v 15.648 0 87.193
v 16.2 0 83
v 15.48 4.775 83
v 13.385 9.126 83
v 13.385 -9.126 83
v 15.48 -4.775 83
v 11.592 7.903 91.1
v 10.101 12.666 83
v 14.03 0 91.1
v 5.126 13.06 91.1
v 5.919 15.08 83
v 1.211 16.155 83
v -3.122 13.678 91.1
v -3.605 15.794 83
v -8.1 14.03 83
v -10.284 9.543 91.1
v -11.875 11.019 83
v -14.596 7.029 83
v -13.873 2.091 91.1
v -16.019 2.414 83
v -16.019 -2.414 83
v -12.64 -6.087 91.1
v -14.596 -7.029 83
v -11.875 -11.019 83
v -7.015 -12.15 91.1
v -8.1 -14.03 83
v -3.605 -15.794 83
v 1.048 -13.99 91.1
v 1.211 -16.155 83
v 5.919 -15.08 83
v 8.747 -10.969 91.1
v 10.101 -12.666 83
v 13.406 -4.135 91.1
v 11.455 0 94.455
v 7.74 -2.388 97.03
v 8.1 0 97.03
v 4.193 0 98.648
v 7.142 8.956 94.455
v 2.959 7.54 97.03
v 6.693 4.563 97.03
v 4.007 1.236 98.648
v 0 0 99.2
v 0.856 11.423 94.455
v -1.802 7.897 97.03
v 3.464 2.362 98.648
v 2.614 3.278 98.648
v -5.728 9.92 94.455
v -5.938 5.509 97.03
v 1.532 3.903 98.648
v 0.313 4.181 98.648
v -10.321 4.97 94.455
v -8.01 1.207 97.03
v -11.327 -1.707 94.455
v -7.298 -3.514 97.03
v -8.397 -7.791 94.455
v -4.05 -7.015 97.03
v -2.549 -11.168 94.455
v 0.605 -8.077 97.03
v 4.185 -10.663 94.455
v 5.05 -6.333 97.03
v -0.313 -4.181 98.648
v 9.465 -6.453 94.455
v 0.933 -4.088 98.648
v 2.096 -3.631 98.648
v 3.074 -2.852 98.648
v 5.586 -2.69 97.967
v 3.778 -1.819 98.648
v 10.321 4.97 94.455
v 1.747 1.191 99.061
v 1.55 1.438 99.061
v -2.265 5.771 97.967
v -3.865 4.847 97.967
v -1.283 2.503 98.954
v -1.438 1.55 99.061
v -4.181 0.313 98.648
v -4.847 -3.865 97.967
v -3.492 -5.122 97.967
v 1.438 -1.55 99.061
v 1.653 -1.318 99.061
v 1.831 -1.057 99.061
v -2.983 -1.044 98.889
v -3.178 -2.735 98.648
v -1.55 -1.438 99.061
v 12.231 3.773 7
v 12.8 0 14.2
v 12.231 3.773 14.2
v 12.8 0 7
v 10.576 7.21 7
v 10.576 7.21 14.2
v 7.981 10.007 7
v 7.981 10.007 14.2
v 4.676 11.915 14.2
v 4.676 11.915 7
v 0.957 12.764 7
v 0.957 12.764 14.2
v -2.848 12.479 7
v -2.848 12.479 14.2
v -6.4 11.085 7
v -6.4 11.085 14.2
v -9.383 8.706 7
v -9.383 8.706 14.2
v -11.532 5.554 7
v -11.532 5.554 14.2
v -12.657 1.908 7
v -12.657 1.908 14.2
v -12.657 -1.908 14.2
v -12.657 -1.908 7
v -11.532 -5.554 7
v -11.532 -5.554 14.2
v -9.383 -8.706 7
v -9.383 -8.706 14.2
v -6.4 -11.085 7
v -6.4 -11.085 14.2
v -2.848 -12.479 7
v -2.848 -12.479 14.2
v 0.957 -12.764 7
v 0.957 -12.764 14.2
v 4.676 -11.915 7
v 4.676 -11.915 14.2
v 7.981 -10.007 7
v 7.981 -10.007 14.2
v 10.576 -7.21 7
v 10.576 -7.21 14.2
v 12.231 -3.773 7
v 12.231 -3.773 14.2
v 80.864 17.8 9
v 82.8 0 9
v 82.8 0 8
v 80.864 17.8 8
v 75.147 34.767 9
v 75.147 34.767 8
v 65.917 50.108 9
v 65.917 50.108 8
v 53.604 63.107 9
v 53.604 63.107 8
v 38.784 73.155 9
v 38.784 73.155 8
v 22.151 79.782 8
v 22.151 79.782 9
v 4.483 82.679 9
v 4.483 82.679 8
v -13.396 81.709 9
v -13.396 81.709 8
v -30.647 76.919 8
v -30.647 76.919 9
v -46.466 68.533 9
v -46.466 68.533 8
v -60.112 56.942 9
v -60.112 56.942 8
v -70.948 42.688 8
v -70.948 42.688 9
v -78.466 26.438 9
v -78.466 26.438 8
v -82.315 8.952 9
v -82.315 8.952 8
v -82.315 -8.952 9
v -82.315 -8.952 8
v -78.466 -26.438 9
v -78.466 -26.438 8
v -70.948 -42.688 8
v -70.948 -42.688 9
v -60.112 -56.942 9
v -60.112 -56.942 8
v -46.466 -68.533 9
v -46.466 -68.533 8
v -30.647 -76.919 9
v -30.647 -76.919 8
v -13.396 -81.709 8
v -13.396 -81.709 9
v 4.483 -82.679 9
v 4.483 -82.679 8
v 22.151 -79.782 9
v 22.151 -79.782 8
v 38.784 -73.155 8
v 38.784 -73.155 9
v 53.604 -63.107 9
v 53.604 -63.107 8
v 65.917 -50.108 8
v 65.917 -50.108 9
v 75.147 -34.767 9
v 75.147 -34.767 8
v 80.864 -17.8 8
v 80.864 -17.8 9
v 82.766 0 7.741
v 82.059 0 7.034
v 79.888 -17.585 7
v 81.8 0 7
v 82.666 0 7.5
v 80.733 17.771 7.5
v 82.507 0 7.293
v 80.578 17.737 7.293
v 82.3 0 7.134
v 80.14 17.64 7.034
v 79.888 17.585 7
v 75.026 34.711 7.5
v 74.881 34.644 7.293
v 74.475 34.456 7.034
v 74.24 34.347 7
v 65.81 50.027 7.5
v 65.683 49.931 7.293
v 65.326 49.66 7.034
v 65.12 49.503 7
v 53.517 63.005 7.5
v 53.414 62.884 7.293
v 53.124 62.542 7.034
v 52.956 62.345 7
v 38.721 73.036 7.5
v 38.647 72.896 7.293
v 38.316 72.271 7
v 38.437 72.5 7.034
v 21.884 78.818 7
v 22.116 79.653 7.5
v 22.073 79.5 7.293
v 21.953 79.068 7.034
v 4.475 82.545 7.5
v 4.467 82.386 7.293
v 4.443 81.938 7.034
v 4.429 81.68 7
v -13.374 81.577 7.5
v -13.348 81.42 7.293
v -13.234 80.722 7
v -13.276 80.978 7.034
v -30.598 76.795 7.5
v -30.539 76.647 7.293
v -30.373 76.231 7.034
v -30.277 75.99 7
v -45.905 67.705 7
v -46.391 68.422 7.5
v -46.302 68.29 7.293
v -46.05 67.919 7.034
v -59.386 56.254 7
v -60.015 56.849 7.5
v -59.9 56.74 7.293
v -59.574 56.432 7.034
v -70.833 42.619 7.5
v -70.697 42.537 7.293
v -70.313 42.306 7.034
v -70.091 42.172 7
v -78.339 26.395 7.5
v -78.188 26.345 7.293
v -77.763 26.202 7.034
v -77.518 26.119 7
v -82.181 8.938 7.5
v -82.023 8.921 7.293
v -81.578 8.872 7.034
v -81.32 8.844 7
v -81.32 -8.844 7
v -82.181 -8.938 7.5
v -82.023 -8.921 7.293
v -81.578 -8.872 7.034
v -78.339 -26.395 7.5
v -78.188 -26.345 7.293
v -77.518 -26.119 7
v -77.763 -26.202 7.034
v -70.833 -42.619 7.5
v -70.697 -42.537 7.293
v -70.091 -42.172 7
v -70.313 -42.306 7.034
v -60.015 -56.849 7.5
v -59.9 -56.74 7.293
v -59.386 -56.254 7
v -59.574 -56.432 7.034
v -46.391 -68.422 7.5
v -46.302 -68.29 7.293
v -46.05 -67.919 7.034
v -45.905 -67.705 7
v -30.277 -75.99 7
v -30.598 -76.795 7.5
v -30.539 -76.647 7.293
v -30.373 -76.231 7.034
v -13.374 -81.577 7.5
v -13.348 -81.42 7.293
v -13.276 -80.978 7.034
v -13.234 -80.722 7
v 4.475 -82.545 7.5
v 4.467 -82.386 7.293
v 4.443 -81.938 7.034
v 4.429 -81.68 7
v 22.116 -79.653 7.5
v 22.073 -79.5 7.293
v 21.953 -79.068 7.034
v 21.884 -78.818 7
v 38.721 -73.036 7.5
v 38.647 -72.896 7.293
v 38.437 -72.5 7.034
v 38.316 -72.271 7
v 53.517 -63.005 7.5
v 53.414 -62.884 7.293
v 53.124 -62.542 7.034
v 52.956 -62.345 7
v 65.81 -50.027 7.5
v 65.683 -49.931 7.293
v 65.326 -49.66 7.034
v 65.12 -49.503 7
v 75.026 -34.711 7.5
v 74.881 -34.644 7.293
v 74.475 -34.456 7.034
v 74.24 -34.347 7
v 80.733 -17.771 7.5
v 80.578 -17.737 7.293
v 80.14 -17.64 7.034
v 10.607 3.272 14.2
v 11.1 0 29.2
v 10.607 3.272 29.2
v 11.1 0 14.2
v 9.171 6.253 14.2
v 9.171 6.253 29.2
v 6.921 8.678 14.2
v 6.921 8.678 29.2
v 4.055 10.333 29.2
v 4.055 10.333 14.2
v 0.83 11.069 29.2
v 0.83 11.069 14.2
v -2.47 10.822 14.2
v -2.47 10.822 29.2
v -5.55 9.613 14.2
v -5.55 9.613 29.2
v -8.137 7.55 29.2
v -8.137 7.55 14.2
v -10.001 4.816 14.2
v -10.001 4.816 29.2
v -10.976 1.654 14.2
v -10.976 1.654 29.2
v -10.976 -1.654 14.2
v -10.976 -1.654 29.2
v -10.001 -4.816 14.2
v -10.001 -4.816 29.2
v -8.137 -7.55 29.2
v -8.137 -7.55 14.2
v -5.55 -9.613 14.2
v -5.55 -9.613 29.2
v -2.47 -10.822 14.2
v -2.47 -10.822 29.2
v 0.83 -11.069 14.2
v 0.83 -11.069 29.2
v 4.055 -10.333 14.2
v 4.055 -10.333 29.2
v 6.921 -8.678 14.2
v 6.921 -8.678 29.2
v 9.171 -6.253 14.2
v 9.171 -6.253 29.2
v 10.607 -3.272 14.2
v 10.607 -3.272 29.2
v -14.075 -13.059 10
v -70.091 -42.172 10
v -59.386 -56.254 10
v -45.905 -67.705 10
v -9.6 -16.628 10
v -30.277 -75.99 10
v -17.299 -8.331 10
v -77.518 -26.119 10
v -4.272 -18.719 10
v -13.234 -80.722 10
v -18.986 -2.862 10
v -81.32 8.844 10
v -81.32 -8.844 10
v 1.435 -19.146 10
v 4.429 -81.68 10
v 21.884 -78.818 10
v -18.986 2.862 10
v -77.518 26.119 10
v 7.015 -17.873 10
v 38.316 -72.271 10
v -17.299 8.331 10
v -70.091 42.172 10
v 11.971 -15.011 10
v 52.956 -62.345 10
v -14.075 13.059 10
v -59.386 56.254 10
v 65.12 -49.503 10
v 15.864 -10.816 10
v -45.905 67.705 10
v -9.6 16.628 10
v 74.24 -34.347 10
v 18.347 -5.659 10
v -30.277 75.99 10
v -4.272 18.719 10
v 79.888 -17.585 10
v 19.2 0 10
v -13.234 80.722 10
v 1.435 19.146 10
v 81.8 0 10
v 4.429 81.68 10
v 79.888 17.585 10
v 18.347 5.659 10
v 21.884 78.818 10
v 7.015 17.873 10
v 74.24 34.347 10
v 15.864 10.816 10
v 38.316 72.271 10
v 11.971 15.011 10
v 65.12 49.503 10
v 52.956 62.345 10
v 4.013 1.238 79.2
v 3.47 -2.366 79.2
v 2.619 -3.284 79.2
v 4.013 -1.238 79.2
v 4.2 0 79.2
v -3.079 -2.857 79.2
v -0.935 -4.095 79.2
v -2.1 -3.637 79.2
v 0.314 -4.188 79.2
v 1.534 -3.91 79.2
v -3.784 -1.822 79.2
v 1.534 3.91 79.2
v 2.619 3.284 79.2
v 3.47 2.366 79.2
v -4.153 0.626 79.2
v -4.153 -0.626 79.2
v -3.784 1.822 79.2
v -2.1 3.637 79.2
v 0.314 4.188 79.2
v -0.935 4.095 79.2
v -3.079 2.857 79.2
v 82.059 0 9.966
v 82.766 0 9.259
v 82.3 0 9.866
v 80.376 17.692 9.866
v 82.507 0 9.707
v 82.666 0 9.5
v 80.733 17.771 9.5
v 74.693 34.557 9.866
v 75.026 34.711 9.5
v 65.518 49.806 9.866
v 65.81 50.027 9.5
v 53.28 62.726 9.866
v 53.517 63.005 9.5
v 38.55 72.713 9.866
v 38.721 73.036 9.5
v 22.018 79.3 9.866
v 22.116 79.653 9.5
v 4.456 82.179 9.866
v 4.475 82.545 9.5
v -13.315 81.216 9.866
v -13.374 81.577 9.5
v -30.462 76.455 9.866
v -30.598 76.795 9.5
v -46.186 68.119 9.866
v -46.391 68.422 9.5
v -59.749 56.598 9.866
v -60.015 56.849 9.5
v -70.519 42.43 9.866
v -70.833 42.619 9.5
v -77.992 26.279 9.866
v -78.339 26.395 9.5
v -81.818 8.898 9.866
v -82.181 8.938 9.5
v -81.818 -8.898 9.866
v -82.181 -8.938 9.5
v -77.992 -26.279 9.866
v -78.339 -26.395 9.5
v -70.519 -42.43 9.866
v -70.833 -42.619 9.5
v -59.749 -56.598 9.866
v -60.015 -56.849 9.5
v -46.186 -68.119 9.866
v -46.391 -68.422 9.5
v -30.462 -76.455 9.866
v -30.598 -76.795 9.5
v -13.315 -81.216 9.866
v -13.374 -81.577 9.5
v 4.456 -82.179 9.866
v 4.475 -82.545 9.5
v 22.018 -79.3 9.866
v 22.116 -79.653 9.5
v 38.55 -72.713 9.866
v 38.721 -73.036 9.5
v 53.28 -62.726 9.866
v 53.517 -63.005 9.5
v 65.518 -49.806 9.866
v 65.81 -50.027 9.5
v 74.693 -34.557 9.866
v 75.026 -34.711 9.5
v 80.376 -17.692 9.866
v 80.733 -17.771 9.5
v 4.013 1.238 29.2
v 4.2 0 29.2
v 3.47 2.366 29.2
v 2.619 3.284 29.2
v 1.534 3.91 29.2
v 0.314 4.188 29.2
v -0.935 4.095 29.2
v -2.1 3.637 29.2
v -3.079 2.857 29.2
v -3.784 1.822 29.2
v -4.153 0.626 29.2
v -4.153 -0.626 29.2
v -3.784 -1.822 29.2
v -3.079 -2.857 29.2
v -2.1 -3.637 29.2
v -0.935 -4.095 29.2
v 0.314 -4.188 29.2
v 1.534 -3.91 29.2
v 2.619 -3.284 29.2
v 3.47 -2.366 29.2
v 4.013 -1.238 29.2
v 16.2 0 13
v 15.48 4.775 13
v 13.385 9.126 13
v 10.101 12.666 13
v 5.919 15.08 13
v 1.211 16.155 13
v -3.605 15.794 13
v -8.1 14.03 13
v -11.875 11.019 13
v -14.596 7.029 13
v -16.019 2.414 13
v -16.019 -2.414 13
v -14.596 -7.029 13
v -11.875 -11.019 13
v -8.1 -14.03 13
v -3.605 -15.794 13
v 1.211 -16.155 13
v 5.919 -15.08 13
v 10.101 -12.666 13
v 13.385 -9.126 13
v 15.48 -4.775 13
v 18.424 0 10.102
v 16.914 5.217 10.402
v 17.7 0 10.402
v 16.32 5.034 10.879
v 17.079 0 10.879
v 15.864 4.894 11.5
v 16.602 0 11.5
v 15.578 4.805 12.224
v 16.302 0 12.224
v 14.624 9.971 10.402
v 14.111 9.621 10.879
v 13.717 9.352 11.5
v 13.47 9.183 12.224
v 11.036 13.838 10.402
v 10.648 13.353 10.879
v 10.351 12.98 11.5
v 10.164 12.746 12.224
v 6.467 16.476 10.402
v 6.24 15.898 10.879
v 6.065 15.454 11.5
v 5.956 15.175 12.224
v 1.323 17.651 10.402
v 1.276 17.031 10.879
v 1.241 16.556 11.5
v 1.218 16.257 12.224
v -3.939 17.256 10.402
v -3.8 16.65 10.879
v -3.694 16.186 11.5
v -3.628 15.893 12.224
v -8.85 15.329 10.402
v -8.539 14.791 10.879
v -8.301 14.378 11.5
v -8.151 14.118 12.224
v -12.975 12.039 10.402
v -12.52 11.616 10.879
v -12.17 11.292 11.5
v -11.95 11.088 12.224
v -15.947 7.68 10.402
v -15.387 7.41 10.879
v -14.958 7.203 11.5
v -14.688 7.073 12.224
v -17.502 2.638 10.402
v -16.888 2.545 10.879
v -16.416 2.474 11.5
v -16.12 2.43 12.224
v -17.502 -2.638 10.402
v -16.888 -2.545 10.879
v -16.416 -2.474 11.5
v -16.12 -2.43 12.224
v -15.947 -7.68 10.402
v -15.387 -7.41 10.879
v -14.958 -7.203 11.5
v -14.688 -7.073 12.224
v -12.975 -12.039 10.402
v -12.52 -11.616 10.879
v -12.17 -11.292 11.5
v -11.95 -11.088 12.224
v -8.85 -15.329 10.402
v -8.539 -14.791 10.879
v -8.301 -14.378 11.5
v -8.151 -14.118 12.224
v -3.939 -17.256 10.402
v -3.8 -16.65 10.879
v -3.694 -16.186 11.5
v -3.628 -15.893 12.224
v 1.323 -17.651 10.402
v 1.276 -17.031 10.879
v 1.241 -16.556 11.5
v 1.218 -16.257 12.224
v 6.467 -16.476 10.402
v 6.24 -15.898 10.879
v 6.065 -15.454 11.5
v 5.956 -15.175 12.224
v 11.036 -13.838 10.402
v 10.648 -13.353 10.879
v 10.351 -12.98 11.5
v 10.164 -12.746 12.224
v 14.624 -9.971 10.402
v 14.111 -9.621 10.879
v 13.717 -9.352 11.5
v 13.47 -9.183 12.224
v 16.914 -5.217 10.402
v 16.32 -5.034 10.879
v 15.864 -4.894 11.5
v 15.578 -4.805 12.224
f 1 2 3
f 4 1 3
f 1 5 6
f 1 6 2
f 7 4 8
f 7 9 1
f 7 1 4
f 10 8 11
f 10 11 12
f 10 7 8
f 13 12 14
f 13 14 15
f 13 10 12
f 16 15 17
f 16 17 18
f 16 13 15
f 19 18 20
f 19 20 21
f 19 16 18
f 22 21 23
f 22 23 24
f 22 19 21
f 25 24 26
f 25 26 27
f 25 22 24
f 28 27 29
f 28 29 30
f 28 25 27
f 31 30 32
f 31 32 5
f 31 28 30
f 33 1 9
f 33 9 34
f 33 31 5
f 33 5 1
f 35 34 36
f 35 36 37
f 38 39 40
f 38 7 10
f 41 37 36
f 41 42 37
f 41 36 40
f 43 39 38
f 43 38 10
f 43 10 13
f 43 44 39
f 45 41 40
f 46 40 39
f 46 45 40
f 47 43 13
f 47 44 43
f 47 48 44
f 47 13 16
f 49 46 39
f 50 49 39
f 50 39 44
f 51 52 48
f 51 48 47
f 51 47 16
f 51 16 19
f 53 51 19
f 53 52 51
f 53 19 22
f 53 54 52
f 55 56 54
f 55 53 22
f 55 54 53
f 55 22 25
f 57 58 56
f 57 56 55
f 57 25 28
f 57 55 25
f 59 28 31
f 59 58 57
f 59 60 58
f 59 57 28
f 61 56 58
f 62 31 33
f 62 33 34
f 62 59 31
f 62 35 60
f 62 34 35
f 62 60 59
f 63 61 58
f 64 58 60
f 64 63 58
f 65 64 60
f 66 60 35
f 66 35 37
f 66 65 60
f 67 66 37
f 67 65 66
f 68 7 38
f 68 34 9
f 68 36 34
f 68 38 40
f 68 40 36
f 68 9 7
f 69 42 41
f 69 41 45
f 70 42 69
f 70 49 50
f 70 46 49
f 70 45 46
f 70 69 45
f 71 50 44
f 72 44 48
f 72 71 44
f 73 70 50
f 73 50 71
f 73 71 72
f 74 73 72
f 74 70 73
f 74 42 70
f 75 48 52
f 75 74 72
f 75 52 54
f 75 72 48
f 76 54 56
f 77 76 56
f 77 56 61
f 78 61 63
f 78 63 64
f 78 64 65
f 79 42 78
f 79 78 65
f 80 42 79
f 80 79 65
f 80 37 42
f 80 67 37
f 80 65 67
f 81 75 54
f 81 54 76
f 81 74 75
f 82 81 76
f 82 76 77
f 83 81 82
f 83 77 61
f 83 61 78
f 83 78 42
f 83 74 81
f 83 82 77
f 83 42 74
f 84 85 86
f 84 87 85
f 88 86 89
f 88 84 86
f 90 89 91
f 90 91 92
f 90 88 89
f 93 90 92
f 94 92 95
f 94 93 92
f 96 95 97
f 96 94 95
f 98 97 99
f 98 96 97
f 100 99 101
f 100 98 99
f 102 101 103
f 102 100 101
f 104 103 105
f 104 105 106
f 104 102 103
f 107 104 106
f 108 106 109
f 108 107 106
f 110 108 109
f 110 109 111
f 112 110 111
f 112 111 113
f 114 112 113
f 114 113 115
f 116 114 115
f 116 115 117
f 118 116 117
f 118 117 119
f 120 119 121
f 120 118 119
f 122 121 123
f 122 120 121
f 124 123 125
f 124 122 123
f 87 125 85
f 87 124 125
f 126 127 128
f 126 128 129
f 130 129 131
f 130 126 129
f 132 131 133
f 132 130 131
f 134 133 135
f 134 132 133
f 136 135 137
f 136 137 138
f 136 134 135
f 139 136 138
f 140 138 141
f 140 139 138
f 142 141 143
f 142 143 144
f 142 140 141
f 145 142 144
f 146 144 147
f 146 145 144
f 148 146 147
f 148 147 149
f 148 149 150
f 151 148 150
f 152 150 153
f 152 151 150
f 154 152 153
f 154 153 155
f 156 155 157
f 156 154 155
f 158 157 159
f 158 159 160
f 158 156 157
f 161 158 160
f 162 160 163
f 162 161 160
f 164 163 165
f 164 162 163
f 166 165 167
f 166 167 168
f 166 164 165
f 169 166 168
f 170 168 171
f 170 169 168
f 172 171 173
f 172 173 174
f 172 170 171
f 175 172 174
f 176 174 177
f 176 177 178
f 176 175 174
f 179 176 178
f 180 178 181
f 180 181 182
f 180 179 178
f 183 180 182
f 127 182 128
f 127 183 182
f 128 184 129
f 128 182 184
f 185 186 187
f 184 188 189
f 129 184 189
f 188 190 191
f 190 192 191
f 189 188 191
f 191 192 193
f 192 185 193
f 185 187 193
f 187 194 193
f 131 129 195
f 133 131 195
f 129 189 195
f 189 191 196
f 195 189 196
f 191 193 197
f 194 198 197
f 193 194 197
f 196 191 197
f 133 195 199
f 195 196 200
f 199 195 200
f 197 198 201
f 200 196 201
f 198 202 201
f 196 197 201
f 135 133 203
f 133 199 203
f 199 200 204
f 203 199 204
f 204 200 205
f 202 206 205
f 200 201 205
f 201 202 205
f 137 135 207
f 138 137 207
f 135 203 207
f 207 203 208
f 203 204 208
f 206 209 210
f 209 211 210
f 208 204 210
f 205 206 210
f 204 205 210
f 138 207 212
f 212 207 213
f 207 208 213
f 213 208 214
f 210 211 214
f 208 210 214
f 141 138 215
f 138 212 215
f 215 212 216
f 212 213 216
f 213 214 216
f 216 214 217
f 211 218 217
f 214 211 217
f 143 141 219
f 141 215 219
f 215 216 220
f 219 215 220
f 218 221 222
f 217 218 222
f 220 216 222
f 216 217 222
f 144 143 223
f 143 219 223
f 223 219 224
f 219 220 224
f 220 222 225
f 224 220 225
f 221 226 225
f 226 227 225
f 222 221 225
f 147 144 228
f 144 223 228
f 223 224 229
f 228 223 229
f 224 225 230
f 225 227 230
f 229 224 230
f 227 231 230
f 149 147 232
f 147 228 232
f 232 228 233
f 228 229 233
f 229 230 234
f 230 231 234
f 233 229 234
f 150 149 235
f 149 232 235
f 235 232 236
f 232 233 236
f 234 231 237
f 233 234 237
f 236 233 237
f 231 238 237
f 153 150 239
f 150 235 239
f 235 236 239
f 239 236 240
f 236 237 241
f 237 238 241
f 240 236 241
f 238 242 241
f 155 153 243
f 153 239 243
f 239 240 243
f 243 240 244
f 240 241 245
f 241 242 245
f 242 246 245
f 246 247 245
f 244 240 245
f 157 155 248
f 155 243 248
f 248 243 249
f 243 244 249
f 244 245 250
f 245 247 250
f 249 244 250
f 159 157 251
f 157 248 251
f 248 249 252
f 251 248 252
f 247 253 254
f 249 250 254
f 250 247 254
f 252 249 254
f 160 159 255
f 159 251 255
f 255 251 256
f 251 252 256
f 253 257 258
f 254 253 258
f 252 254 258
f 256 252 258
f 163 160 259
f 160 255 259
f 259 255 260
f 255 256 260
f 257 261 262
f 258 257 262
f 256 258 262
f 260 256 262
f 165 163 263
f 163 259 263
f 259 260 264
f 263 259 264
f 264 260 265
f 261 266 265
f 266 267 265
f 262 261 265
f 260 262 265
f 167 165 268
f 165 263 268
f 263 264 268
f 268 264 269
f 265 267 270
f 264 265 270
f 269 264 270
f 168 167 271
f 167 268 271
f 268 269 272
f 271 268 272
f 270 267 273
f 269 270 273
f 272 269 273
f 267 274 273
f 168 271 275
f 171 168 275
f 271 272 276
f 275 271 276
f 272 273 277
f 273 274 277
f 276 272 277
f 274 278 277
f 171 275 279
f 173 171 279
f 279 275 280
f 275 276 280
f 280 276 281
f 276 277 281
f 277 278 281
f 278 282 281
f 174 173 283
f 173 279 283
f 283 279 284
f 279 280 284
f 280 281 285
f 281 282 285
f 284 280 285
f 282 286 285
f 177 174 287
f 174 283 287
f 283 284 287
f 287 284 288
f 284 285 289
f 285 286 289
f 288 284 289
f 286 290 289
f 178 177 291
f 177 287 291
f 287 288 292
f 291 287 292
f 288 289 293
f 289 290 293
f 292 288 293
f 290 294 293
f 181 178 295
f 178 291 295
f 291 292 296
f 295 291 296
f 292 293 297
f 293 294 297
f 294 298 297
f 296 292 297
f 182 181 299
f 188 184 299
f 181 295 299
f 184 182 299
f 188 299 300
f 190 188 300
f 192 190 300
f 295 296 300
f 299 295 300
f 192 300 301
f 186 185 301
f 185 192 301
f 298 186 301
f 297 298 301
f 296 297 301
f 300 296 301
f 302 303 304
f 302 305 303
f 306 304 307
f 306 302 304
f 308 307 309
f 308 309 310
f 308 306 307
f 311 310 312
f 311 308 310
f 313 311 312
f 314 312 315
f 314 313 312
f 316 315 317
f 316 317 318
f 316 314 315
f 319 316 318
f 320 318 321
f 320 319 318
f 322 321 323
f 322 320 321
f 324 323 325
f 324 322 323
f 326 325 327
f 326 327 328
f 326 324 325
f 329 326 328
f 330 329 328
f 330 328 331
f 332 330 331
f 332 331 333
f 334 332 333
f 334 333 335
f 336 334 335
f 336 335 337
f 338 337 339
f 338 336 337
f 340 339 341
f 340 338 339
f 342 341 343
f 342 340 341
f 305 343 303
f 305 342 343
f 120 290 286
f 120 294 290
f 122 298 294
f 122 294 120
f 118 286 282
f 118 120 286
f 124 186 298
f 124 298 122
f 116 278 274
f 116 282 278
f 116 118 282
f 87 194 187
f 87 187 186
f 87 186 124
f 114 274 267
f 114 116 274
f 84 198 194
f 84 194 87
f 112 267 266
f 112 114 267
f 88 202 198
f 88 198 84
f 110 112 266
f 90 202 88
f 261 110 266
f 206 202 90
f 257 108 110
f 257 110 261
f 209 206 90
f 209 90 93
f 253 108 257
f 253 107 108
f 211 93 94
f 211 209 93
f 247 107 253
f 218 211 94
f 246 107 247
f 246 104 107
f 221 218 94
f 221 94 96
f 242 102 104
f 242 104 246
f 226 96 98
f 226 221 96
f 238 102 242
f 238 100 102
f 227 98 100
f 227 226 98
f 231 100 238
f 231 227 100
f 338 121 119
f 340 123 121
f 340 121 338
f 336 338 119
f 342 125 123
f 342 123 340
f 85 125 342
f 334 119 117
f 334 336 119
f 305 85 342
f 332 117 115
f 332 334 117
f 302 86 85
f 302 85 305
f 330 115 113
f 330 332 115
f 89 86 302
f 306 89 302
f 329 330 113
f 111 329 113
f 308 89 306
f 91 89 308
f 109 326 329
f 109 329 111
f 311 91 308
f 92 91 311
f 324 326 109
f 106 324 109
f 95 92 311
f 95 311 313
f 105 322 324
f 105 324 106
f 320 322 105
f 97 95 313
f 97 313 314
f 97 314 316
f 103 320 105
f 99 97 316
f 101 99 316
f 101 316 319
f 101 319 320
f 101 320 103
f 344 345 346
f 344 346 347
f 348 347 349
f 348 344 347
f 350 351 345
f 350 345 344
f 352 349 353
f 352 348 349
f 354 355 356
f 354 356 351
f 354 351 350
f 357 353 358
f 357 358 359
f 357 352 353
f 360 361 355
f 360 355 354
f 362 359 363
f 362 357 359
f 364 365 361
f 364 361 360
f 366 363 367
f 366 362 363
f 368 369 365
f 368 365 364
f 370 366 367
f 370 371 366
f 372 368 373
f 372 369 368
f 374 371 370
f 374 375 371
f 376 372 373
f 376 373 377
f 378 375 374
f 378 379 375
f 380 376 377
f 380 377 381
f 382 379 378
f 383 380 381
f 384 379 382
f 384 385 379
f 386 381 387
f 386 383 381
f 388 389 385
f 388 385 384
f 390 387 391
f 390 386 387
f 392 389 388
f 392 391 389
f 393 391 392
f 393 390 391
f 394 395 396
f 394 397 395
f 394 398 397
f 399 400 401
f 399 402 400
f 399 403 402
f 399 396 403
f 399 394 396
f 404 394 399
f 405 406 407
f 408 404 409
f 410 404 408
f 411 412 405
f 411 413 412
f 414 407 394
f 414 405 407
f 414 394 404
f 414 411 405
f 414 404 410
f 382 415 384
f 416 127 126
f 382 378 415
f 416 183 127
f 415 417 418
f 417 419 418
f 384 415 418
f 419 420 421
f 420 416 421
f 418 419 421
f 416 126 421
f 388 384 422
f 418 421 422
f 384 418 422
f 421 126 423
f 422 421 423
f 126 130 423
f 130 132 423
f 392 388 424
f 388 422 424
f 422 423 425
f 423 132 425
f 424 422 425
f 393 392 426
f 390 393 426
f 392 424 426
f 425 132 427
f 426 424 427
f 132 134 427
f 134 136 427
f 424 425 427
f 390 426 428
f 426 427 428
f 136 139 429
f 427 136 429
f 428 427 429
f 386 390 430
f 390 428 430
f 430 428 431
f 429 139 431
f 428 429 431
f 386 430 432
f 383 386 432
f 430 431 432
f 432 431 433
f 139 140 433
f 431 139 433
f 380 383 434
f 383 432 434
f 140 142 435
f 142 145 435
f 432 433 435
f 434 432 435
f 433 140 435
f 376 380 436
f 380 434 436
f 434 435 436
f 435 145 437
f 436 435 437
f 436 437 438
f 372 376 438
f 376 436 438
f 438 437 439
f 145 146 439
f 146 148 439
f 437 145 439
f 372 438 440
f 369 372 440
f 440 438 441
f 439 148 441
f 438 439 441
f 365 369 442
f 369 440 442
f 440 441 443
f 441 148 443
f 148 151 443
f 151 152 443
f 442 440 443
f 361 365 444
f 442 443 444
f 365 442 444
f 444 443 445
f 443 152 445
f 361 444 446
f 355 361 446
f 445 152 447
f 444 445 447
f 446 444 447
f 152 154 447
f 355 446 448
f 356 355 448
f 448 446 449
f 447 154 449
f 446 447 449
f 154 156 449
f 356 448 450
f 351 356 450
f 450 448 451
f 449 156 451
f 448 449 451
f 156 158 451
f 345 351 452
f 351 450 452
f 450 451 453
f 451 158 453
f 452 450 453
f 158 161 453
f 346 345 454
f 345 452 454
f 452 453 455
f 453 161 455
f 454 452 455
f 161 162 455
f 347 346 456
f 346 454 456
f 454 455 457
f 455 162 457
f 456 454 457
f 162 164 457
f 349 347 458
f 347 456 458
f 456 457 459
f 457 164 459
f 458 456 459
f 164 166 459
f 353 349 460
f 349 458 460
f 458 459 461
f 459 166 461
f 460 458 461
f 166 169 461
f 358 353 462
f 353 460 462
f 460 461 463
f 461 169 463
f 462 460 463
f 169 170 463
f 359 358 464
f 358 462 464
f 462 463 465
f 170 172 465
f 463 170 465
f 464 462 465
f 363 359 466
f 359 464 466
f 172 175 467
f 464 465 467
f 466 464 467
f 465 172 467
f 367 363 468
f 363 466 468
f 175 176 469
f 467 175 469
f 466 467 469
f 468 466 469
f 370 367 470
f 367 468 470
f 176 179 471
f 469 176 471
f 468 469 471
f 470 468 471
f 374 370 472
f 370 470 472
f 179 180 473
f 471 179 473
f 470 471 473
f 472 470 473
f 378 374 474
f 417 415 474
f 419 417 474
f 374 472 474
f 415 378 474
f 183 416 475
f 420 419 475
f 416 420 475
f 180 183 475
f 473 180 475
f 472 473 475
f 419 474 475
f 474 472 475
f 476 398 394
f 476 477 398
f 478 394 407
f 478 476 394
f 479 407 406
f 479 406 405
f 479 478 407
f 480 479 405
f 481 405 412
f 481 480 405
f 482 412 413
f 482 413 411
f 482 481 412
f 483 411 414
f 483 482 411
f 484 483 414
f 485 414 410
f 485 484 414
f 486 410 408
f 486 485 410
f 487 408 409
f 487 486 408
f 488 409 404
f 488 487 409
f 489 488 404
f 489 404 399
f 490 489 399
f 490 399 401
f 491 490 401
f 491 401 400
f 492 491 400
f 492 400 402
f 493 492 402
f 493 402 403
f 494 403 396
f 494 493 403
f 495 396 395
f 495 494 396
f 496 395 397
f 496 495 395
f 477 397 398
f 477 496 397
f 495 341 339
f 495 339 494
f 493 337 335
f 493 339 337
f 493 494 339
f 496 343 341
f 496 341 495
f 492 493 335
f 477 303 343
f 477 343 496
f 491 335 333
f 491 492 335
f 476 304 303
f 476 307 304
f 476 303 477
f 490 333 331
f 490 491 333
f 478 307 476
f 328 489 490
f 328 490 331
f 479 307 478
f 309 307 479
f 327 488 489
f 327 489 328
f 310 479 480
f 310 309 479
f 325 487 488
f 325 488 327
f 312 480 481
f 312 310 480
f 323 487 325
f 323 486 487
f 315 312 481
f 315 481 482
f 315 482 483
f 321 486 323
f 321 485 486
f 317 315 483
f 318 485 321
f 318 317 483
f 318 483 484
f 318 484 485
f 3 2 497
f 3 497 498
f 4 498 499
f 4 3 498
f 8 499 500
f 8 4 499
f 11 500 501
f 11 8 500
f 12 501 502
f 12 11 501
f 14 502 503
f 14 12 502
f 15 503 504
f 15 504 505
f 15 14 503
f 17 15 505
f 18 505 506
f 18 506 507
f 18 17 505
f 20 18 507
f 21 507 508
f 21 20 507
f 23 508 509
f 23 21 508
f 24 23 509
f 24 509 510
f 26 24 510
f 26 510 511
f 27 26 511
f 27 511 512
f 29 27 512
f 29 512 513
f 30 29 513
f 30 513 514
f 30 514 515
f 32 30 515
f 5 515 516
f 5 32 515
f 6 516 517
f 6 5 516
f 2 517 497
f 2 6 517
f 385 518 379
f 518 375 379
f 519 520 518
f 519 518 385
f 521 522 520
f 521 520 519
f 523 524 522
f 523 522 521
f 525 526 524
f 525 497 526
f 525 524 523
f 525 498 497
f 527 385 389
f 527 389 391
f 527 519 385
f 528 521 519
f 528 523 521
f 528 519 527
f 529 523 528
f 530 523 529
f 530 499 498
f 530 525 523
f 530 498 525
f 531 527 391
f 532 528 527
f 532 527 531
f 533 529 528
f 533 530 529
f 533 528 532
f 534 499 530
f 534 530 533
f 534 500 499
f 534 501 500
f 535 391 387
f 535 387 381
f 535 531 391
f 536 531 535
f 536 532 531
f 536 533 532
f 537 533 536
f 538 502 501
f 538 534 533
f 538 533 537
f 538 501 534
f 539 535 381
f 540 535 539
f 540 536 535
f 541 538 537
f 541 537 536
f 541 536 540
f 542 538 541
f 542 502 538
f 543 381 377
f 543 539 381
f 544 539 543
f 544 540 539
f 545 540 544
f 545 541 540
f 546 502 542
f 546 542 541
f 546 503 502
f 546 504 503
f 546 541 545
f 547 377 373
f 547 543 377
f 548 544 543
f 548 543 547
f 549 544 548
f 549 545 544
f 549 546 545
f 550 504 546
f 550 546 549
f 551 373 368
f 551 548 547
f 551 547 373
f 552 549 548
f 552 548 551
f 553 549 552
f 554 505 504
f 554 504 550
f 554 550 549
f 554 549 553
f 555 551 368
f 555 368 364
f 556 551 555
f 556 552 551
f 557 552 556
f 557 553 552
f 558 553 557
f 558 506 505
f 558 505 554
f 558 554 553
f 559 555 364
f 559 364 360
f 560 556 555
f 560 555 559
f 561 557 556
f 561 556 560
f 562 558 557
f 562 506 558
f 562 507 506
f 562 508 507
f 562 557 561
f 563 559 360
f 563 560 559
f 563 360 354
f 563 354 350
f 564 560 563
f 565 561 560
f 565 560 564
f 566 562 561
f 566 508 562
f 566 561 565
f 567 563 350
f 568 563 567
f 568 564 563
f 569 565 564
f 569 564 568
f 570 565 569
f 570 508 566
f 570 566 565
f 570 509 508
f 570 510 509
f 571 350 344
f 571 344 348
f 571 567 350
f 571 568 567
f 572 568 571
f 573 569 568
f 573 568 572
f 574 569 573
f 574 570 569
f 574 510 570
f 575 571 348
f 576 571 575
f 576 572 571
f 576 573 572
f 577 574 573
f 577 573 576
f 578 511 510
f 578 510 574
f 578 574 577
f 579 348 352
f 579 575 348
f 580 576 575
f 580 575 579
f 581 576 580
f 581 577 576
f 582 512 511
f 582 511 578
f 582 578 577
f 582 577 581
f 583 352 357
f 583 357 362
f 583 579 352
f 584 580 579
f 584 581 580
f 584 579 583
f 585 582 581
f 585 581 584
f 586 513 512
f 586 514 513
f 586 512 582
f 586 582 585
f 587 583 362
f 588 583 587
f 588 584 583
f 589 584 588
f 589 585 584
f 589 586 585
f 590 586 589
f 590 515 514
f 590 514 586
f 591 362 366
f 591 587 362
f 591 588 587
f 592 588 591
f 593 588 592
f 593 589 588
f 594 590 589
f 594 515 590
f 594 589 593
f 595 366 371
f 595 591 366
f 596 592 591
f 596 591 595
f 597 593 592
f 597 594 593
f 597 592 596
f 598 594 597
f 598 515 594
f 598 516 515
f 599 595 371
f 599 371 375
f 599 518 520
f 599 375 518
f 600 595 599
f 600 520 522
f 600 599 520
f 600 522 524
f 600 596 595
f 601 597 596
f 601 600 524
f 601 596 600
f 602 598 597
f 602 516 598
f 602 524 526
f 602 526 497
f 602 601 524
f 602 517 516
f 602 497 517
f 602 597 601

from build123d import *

# Parameters (mm, degrees)
FILLET004_R = 3
FILLET005_R = 1


with BuildPart() as part:
    # Sketch010 → Revolution (revolve)
    with BuildSketch(Plane.XZ):
        with BuildLine():
            Line((0, 79.2), (4.2, 79.2))
            Line((4.2, 79.2), (4.2, 29.2))
            Line((4.2, 29.2), (11.1, 29.2))
            Line((11.1, 29.2), (11.1, 14.2))
            Line((11.1, 14.2), (12.8, 14.2))
            Line((12.8, 14.2), (12.8, 7))
            Line((12.8, 7), (82.8, 7))
            Line((82.8, 7), (82.8, 10))
            Line((82.8, 10), (16.2, 10))
            Line((16.2, 10), (16.2, 83))
            ThreePointArc((16.2, 83), (11.45513, 94.45513), (0, 99.2))
            Line((0, 79.2), (0, 99.2))
        make_face()
    revolve(axis=Axis((0, 0, 0), (0, 0, 1)))

    # Fillet004
    fillet004_edges = [part.edges().sort_by_distance(p)[0] for p in [
        (-16.2, 0, 10),
    ]]
    fillet(fillet004_edges, radius=FILLET004_R)

    # Fillet005
    fillet005_edges = [part.edges().sort_by_distance(p)[0] for p in [
        (-82.8, 0, 10),
        (-82.8, 0, 7),
    ]]
    fillet(fillet005_edges, radius=FILLET005_R)


solid = part.part
